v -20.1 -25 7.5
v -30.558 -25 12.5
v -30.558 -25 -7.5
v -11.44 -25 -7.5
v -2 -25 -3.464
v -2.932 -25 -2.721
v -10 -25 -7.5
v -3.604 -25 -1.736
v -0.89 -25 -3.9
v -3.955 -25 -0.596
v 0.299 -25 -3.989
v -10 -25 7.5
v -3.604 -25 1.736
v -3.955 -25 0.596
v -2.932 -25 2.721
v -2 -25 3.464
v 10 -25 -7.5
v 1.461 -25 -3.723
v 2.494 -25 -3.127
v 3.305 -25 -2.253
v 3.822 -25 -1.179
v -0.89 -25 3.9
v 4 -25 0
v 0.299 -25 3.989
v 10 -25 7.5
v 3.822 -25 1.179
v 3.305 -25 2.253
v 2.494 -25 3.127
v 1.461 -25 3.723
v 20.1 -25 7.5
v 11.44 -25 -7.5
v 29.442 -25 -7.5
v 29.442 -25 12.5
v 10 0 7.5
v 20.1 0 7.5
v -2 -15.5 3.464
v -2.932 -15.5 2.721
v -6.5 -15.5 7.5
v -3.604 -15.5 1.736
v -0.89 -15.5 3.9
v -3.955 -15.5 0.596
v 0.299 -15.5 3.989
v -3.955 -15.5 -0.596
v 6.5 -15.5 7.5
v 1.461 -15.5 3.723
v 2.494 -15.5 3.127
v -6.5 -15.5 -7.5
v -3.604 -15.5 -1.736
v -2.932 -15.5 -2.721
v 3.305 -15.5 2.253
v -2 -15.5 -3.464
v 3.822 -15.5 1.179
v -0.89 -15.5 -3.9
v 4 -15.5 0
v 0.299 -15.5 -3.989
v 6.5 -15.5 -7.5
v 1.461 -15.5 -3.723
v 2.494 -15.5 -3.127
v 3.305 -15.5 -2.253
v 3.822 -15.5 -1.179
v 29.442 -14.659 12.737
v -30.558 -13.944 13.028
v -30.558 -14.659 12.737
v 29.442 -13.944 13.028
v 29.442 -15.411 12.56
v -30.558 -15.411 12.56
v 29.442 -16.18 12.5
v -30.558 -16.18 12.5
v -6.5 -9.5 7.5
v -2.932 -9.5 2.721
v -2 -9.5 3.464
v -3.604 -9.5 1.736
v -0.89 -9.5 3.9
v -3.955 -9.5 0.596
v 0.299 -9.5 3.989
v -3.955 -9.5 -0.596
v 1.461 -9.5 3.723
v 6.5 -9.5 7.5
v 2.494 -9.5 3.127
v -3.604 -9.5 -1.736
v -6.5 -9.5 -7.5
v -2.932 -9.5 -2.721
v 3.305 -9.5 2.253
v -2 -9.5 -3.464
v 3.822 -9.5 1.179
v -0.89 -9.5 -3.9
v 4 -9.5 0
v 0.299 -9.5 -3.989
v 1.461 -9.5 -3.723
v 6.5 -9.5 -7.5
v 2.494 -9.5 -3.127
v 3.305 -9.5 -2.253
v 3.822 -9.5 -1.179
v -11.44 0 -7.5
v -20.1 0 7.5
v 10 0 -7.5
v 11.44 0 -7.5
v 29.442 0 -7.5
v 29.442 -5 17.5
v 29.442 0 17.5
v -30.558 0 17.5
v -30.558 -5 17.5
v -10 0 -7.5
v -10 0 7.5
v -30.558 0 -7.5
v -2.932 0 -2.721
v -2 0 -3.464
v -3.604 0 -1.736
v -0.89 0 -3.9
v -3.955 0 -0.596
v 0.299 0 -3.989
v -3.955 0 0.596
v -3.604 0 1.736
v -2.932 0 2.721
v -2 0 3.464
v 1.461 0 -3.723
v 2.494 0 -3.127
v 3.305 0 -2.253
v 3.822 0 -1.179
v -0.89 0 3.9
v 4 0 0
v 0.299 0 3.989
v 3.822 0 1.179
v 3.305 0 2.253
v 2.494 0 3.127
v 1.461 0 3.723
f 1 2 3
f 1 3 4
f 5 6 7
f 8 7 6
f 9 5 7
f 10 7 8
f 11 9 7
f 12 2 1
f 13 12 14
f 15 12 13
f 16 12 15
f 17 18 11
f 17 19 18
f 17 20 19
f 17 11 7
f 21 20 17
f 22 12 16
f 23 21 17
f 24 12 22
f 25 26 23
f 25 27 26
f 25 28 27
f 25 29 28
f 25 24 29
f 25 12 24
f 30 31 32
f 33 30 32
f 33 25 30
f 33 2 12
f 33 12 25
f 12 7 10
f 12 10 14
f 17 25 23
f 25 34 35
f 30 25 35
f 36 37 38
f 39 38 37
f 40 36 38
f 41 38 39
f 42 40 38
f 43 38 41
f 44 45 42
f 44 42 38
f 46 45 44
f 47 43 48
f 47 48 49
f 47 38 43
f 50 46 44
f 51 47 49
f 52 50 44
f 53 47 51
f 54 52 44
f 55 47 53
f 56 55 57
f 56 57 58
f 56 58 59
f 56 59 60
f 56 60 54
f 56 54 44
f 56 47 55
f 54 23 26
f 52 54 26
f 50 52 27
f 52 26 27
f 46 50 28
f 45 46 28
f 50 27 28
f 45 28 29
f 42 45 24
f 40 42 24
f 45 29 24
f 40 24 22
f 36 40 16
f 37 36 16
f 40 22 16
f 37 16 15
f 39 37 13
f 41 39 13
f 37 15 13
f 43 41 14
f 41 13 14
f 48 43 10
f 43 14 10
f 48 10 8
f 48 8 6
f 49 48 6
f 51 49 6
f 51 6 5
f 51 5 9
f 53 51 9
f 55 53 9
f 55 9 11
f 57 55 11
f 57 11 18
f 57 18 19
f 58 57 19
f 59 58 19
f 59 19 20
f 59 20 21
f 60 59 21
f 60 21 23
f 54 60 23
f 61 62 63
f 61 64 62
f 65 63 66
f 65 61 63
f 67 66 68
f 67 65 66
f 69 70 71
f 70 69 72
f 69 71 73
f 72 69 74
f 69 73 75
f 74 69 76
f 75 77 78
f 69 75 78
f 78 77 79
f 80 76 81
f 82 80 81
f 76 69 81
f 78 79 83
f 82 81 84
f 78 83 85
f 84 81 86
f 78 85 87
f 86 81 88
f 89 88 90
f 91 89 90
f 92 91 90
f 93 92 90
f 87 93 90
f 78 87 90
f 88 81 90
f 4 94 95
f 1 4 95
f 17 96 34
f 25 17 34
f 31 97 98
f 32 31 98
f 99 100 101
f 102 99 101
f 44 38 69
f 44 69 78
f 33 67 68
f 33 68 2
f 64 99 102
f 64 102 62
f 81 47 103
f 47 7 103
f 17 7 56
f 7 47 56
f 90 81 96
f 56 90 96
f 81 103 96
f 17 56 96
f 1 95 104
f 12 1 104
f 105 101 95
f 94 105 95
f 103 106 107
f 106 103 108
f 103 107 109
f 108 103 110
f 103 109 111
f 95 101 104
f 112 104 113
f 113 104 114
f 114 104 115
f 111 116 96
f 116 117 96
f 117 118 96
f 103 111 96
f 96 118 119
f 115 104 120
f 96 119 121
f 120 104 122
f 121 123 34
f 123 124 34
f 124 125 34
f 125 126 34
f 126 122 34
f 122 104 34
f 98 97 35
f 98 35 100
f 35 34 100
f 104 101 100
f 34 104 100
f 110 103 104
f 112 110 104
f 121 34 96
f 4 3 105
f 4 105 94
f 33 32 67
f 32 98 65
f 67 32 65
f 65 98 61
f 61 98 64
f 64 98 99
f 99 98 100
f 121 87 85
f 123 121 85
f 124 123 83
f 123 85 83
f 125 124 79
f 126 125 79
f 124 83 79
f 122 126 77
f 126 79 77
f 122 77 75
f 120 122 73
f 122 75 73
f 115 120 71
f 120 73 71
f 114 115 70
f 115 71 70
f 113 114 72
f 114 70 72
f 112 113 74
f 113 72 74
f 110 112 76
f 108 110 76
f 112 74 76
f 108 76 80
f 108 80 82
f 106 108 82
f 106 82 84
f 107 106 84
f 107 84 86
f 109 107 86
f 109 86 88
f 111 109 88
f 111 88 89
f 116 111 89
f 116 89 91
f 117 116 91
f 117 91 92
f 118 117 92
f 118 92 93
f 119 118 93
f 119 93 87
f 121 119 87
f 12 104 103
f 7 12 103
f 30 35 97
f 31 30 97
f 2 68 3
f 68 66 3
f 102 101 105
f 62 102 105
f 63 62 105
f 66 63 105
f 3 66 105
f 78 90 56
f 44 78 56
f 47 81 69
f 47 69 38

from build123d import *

# Parameters (mm, degrees)
F1_DEPTH = 25
F3_DEPTH = 60.001
F4_R     = 5
F5_W     = 13
F5_H     = 6
F6_DEPTH = 15
F7_R     = 4
F8_DEPTH = 25.001


with BuildPart() as f1:
    # F0 (on Front) → F1 (new body)
    with BuildSketch(Plane.XZ):
        Polygon((29.442134, 17.5), (-30.557866, 17.5), (-30.557866, -7.5), (-20.1, -7.5), (-20.1, 7.5), (-10, 7.5), (-10, -7.5), (10, -7.5), (10, 7.5), (20.1, 7.5), (11.439746, -7.5), (29.442134, -7.5), align=None)
        Polygon((-20.1, 7.5), (-20.1, -7.5), (-11.439746, -7.5), align=None)
    extrude(amount=F1_DEPTH)

    # F2 (on face) → F3 (cut, through all)
    with BuildSketch(Plane(origin=(-30.557866, 0, 0), x_dir=(0, -1, 0), z_dir=(-1, 0, 0))):
        Polygon((15, 12.5), (25, 12.5), (25, 17.5), (5, 17.5), align=None)
    extrude(amount=-F3_DEPTH, mode=Mode.SUBTRACT)

    # F4
    f4_edges = [f1.edges().sort_by_distance(p)[0] for p in [
        (-0.557866, -15, 12.5),
    ]]
    fillet(f4_edges, radius=F4_R)

    # F5 (on face) → F6 (cut)
    with BuildSketch(Plane(origin=(0, 0, -7.5), x_dir=(1, 0, 0), z_dir=(0, 0, -1))):
        with Locations((0, 12.5)):
            Rectangle(F5_W, F5_H)
    extrude(amount=-F6_DEPTH, mode=Mode.SUBTRACT)

    # F7 (on face) → F8 (cut, through all)
    with BuildSketch(Plane.XZ.offset(25)):
        Circle(F7_R)
    extrude(amount=-F8_DEPTH, mode=Mode.SUBTRACT)


solid = f1.part
